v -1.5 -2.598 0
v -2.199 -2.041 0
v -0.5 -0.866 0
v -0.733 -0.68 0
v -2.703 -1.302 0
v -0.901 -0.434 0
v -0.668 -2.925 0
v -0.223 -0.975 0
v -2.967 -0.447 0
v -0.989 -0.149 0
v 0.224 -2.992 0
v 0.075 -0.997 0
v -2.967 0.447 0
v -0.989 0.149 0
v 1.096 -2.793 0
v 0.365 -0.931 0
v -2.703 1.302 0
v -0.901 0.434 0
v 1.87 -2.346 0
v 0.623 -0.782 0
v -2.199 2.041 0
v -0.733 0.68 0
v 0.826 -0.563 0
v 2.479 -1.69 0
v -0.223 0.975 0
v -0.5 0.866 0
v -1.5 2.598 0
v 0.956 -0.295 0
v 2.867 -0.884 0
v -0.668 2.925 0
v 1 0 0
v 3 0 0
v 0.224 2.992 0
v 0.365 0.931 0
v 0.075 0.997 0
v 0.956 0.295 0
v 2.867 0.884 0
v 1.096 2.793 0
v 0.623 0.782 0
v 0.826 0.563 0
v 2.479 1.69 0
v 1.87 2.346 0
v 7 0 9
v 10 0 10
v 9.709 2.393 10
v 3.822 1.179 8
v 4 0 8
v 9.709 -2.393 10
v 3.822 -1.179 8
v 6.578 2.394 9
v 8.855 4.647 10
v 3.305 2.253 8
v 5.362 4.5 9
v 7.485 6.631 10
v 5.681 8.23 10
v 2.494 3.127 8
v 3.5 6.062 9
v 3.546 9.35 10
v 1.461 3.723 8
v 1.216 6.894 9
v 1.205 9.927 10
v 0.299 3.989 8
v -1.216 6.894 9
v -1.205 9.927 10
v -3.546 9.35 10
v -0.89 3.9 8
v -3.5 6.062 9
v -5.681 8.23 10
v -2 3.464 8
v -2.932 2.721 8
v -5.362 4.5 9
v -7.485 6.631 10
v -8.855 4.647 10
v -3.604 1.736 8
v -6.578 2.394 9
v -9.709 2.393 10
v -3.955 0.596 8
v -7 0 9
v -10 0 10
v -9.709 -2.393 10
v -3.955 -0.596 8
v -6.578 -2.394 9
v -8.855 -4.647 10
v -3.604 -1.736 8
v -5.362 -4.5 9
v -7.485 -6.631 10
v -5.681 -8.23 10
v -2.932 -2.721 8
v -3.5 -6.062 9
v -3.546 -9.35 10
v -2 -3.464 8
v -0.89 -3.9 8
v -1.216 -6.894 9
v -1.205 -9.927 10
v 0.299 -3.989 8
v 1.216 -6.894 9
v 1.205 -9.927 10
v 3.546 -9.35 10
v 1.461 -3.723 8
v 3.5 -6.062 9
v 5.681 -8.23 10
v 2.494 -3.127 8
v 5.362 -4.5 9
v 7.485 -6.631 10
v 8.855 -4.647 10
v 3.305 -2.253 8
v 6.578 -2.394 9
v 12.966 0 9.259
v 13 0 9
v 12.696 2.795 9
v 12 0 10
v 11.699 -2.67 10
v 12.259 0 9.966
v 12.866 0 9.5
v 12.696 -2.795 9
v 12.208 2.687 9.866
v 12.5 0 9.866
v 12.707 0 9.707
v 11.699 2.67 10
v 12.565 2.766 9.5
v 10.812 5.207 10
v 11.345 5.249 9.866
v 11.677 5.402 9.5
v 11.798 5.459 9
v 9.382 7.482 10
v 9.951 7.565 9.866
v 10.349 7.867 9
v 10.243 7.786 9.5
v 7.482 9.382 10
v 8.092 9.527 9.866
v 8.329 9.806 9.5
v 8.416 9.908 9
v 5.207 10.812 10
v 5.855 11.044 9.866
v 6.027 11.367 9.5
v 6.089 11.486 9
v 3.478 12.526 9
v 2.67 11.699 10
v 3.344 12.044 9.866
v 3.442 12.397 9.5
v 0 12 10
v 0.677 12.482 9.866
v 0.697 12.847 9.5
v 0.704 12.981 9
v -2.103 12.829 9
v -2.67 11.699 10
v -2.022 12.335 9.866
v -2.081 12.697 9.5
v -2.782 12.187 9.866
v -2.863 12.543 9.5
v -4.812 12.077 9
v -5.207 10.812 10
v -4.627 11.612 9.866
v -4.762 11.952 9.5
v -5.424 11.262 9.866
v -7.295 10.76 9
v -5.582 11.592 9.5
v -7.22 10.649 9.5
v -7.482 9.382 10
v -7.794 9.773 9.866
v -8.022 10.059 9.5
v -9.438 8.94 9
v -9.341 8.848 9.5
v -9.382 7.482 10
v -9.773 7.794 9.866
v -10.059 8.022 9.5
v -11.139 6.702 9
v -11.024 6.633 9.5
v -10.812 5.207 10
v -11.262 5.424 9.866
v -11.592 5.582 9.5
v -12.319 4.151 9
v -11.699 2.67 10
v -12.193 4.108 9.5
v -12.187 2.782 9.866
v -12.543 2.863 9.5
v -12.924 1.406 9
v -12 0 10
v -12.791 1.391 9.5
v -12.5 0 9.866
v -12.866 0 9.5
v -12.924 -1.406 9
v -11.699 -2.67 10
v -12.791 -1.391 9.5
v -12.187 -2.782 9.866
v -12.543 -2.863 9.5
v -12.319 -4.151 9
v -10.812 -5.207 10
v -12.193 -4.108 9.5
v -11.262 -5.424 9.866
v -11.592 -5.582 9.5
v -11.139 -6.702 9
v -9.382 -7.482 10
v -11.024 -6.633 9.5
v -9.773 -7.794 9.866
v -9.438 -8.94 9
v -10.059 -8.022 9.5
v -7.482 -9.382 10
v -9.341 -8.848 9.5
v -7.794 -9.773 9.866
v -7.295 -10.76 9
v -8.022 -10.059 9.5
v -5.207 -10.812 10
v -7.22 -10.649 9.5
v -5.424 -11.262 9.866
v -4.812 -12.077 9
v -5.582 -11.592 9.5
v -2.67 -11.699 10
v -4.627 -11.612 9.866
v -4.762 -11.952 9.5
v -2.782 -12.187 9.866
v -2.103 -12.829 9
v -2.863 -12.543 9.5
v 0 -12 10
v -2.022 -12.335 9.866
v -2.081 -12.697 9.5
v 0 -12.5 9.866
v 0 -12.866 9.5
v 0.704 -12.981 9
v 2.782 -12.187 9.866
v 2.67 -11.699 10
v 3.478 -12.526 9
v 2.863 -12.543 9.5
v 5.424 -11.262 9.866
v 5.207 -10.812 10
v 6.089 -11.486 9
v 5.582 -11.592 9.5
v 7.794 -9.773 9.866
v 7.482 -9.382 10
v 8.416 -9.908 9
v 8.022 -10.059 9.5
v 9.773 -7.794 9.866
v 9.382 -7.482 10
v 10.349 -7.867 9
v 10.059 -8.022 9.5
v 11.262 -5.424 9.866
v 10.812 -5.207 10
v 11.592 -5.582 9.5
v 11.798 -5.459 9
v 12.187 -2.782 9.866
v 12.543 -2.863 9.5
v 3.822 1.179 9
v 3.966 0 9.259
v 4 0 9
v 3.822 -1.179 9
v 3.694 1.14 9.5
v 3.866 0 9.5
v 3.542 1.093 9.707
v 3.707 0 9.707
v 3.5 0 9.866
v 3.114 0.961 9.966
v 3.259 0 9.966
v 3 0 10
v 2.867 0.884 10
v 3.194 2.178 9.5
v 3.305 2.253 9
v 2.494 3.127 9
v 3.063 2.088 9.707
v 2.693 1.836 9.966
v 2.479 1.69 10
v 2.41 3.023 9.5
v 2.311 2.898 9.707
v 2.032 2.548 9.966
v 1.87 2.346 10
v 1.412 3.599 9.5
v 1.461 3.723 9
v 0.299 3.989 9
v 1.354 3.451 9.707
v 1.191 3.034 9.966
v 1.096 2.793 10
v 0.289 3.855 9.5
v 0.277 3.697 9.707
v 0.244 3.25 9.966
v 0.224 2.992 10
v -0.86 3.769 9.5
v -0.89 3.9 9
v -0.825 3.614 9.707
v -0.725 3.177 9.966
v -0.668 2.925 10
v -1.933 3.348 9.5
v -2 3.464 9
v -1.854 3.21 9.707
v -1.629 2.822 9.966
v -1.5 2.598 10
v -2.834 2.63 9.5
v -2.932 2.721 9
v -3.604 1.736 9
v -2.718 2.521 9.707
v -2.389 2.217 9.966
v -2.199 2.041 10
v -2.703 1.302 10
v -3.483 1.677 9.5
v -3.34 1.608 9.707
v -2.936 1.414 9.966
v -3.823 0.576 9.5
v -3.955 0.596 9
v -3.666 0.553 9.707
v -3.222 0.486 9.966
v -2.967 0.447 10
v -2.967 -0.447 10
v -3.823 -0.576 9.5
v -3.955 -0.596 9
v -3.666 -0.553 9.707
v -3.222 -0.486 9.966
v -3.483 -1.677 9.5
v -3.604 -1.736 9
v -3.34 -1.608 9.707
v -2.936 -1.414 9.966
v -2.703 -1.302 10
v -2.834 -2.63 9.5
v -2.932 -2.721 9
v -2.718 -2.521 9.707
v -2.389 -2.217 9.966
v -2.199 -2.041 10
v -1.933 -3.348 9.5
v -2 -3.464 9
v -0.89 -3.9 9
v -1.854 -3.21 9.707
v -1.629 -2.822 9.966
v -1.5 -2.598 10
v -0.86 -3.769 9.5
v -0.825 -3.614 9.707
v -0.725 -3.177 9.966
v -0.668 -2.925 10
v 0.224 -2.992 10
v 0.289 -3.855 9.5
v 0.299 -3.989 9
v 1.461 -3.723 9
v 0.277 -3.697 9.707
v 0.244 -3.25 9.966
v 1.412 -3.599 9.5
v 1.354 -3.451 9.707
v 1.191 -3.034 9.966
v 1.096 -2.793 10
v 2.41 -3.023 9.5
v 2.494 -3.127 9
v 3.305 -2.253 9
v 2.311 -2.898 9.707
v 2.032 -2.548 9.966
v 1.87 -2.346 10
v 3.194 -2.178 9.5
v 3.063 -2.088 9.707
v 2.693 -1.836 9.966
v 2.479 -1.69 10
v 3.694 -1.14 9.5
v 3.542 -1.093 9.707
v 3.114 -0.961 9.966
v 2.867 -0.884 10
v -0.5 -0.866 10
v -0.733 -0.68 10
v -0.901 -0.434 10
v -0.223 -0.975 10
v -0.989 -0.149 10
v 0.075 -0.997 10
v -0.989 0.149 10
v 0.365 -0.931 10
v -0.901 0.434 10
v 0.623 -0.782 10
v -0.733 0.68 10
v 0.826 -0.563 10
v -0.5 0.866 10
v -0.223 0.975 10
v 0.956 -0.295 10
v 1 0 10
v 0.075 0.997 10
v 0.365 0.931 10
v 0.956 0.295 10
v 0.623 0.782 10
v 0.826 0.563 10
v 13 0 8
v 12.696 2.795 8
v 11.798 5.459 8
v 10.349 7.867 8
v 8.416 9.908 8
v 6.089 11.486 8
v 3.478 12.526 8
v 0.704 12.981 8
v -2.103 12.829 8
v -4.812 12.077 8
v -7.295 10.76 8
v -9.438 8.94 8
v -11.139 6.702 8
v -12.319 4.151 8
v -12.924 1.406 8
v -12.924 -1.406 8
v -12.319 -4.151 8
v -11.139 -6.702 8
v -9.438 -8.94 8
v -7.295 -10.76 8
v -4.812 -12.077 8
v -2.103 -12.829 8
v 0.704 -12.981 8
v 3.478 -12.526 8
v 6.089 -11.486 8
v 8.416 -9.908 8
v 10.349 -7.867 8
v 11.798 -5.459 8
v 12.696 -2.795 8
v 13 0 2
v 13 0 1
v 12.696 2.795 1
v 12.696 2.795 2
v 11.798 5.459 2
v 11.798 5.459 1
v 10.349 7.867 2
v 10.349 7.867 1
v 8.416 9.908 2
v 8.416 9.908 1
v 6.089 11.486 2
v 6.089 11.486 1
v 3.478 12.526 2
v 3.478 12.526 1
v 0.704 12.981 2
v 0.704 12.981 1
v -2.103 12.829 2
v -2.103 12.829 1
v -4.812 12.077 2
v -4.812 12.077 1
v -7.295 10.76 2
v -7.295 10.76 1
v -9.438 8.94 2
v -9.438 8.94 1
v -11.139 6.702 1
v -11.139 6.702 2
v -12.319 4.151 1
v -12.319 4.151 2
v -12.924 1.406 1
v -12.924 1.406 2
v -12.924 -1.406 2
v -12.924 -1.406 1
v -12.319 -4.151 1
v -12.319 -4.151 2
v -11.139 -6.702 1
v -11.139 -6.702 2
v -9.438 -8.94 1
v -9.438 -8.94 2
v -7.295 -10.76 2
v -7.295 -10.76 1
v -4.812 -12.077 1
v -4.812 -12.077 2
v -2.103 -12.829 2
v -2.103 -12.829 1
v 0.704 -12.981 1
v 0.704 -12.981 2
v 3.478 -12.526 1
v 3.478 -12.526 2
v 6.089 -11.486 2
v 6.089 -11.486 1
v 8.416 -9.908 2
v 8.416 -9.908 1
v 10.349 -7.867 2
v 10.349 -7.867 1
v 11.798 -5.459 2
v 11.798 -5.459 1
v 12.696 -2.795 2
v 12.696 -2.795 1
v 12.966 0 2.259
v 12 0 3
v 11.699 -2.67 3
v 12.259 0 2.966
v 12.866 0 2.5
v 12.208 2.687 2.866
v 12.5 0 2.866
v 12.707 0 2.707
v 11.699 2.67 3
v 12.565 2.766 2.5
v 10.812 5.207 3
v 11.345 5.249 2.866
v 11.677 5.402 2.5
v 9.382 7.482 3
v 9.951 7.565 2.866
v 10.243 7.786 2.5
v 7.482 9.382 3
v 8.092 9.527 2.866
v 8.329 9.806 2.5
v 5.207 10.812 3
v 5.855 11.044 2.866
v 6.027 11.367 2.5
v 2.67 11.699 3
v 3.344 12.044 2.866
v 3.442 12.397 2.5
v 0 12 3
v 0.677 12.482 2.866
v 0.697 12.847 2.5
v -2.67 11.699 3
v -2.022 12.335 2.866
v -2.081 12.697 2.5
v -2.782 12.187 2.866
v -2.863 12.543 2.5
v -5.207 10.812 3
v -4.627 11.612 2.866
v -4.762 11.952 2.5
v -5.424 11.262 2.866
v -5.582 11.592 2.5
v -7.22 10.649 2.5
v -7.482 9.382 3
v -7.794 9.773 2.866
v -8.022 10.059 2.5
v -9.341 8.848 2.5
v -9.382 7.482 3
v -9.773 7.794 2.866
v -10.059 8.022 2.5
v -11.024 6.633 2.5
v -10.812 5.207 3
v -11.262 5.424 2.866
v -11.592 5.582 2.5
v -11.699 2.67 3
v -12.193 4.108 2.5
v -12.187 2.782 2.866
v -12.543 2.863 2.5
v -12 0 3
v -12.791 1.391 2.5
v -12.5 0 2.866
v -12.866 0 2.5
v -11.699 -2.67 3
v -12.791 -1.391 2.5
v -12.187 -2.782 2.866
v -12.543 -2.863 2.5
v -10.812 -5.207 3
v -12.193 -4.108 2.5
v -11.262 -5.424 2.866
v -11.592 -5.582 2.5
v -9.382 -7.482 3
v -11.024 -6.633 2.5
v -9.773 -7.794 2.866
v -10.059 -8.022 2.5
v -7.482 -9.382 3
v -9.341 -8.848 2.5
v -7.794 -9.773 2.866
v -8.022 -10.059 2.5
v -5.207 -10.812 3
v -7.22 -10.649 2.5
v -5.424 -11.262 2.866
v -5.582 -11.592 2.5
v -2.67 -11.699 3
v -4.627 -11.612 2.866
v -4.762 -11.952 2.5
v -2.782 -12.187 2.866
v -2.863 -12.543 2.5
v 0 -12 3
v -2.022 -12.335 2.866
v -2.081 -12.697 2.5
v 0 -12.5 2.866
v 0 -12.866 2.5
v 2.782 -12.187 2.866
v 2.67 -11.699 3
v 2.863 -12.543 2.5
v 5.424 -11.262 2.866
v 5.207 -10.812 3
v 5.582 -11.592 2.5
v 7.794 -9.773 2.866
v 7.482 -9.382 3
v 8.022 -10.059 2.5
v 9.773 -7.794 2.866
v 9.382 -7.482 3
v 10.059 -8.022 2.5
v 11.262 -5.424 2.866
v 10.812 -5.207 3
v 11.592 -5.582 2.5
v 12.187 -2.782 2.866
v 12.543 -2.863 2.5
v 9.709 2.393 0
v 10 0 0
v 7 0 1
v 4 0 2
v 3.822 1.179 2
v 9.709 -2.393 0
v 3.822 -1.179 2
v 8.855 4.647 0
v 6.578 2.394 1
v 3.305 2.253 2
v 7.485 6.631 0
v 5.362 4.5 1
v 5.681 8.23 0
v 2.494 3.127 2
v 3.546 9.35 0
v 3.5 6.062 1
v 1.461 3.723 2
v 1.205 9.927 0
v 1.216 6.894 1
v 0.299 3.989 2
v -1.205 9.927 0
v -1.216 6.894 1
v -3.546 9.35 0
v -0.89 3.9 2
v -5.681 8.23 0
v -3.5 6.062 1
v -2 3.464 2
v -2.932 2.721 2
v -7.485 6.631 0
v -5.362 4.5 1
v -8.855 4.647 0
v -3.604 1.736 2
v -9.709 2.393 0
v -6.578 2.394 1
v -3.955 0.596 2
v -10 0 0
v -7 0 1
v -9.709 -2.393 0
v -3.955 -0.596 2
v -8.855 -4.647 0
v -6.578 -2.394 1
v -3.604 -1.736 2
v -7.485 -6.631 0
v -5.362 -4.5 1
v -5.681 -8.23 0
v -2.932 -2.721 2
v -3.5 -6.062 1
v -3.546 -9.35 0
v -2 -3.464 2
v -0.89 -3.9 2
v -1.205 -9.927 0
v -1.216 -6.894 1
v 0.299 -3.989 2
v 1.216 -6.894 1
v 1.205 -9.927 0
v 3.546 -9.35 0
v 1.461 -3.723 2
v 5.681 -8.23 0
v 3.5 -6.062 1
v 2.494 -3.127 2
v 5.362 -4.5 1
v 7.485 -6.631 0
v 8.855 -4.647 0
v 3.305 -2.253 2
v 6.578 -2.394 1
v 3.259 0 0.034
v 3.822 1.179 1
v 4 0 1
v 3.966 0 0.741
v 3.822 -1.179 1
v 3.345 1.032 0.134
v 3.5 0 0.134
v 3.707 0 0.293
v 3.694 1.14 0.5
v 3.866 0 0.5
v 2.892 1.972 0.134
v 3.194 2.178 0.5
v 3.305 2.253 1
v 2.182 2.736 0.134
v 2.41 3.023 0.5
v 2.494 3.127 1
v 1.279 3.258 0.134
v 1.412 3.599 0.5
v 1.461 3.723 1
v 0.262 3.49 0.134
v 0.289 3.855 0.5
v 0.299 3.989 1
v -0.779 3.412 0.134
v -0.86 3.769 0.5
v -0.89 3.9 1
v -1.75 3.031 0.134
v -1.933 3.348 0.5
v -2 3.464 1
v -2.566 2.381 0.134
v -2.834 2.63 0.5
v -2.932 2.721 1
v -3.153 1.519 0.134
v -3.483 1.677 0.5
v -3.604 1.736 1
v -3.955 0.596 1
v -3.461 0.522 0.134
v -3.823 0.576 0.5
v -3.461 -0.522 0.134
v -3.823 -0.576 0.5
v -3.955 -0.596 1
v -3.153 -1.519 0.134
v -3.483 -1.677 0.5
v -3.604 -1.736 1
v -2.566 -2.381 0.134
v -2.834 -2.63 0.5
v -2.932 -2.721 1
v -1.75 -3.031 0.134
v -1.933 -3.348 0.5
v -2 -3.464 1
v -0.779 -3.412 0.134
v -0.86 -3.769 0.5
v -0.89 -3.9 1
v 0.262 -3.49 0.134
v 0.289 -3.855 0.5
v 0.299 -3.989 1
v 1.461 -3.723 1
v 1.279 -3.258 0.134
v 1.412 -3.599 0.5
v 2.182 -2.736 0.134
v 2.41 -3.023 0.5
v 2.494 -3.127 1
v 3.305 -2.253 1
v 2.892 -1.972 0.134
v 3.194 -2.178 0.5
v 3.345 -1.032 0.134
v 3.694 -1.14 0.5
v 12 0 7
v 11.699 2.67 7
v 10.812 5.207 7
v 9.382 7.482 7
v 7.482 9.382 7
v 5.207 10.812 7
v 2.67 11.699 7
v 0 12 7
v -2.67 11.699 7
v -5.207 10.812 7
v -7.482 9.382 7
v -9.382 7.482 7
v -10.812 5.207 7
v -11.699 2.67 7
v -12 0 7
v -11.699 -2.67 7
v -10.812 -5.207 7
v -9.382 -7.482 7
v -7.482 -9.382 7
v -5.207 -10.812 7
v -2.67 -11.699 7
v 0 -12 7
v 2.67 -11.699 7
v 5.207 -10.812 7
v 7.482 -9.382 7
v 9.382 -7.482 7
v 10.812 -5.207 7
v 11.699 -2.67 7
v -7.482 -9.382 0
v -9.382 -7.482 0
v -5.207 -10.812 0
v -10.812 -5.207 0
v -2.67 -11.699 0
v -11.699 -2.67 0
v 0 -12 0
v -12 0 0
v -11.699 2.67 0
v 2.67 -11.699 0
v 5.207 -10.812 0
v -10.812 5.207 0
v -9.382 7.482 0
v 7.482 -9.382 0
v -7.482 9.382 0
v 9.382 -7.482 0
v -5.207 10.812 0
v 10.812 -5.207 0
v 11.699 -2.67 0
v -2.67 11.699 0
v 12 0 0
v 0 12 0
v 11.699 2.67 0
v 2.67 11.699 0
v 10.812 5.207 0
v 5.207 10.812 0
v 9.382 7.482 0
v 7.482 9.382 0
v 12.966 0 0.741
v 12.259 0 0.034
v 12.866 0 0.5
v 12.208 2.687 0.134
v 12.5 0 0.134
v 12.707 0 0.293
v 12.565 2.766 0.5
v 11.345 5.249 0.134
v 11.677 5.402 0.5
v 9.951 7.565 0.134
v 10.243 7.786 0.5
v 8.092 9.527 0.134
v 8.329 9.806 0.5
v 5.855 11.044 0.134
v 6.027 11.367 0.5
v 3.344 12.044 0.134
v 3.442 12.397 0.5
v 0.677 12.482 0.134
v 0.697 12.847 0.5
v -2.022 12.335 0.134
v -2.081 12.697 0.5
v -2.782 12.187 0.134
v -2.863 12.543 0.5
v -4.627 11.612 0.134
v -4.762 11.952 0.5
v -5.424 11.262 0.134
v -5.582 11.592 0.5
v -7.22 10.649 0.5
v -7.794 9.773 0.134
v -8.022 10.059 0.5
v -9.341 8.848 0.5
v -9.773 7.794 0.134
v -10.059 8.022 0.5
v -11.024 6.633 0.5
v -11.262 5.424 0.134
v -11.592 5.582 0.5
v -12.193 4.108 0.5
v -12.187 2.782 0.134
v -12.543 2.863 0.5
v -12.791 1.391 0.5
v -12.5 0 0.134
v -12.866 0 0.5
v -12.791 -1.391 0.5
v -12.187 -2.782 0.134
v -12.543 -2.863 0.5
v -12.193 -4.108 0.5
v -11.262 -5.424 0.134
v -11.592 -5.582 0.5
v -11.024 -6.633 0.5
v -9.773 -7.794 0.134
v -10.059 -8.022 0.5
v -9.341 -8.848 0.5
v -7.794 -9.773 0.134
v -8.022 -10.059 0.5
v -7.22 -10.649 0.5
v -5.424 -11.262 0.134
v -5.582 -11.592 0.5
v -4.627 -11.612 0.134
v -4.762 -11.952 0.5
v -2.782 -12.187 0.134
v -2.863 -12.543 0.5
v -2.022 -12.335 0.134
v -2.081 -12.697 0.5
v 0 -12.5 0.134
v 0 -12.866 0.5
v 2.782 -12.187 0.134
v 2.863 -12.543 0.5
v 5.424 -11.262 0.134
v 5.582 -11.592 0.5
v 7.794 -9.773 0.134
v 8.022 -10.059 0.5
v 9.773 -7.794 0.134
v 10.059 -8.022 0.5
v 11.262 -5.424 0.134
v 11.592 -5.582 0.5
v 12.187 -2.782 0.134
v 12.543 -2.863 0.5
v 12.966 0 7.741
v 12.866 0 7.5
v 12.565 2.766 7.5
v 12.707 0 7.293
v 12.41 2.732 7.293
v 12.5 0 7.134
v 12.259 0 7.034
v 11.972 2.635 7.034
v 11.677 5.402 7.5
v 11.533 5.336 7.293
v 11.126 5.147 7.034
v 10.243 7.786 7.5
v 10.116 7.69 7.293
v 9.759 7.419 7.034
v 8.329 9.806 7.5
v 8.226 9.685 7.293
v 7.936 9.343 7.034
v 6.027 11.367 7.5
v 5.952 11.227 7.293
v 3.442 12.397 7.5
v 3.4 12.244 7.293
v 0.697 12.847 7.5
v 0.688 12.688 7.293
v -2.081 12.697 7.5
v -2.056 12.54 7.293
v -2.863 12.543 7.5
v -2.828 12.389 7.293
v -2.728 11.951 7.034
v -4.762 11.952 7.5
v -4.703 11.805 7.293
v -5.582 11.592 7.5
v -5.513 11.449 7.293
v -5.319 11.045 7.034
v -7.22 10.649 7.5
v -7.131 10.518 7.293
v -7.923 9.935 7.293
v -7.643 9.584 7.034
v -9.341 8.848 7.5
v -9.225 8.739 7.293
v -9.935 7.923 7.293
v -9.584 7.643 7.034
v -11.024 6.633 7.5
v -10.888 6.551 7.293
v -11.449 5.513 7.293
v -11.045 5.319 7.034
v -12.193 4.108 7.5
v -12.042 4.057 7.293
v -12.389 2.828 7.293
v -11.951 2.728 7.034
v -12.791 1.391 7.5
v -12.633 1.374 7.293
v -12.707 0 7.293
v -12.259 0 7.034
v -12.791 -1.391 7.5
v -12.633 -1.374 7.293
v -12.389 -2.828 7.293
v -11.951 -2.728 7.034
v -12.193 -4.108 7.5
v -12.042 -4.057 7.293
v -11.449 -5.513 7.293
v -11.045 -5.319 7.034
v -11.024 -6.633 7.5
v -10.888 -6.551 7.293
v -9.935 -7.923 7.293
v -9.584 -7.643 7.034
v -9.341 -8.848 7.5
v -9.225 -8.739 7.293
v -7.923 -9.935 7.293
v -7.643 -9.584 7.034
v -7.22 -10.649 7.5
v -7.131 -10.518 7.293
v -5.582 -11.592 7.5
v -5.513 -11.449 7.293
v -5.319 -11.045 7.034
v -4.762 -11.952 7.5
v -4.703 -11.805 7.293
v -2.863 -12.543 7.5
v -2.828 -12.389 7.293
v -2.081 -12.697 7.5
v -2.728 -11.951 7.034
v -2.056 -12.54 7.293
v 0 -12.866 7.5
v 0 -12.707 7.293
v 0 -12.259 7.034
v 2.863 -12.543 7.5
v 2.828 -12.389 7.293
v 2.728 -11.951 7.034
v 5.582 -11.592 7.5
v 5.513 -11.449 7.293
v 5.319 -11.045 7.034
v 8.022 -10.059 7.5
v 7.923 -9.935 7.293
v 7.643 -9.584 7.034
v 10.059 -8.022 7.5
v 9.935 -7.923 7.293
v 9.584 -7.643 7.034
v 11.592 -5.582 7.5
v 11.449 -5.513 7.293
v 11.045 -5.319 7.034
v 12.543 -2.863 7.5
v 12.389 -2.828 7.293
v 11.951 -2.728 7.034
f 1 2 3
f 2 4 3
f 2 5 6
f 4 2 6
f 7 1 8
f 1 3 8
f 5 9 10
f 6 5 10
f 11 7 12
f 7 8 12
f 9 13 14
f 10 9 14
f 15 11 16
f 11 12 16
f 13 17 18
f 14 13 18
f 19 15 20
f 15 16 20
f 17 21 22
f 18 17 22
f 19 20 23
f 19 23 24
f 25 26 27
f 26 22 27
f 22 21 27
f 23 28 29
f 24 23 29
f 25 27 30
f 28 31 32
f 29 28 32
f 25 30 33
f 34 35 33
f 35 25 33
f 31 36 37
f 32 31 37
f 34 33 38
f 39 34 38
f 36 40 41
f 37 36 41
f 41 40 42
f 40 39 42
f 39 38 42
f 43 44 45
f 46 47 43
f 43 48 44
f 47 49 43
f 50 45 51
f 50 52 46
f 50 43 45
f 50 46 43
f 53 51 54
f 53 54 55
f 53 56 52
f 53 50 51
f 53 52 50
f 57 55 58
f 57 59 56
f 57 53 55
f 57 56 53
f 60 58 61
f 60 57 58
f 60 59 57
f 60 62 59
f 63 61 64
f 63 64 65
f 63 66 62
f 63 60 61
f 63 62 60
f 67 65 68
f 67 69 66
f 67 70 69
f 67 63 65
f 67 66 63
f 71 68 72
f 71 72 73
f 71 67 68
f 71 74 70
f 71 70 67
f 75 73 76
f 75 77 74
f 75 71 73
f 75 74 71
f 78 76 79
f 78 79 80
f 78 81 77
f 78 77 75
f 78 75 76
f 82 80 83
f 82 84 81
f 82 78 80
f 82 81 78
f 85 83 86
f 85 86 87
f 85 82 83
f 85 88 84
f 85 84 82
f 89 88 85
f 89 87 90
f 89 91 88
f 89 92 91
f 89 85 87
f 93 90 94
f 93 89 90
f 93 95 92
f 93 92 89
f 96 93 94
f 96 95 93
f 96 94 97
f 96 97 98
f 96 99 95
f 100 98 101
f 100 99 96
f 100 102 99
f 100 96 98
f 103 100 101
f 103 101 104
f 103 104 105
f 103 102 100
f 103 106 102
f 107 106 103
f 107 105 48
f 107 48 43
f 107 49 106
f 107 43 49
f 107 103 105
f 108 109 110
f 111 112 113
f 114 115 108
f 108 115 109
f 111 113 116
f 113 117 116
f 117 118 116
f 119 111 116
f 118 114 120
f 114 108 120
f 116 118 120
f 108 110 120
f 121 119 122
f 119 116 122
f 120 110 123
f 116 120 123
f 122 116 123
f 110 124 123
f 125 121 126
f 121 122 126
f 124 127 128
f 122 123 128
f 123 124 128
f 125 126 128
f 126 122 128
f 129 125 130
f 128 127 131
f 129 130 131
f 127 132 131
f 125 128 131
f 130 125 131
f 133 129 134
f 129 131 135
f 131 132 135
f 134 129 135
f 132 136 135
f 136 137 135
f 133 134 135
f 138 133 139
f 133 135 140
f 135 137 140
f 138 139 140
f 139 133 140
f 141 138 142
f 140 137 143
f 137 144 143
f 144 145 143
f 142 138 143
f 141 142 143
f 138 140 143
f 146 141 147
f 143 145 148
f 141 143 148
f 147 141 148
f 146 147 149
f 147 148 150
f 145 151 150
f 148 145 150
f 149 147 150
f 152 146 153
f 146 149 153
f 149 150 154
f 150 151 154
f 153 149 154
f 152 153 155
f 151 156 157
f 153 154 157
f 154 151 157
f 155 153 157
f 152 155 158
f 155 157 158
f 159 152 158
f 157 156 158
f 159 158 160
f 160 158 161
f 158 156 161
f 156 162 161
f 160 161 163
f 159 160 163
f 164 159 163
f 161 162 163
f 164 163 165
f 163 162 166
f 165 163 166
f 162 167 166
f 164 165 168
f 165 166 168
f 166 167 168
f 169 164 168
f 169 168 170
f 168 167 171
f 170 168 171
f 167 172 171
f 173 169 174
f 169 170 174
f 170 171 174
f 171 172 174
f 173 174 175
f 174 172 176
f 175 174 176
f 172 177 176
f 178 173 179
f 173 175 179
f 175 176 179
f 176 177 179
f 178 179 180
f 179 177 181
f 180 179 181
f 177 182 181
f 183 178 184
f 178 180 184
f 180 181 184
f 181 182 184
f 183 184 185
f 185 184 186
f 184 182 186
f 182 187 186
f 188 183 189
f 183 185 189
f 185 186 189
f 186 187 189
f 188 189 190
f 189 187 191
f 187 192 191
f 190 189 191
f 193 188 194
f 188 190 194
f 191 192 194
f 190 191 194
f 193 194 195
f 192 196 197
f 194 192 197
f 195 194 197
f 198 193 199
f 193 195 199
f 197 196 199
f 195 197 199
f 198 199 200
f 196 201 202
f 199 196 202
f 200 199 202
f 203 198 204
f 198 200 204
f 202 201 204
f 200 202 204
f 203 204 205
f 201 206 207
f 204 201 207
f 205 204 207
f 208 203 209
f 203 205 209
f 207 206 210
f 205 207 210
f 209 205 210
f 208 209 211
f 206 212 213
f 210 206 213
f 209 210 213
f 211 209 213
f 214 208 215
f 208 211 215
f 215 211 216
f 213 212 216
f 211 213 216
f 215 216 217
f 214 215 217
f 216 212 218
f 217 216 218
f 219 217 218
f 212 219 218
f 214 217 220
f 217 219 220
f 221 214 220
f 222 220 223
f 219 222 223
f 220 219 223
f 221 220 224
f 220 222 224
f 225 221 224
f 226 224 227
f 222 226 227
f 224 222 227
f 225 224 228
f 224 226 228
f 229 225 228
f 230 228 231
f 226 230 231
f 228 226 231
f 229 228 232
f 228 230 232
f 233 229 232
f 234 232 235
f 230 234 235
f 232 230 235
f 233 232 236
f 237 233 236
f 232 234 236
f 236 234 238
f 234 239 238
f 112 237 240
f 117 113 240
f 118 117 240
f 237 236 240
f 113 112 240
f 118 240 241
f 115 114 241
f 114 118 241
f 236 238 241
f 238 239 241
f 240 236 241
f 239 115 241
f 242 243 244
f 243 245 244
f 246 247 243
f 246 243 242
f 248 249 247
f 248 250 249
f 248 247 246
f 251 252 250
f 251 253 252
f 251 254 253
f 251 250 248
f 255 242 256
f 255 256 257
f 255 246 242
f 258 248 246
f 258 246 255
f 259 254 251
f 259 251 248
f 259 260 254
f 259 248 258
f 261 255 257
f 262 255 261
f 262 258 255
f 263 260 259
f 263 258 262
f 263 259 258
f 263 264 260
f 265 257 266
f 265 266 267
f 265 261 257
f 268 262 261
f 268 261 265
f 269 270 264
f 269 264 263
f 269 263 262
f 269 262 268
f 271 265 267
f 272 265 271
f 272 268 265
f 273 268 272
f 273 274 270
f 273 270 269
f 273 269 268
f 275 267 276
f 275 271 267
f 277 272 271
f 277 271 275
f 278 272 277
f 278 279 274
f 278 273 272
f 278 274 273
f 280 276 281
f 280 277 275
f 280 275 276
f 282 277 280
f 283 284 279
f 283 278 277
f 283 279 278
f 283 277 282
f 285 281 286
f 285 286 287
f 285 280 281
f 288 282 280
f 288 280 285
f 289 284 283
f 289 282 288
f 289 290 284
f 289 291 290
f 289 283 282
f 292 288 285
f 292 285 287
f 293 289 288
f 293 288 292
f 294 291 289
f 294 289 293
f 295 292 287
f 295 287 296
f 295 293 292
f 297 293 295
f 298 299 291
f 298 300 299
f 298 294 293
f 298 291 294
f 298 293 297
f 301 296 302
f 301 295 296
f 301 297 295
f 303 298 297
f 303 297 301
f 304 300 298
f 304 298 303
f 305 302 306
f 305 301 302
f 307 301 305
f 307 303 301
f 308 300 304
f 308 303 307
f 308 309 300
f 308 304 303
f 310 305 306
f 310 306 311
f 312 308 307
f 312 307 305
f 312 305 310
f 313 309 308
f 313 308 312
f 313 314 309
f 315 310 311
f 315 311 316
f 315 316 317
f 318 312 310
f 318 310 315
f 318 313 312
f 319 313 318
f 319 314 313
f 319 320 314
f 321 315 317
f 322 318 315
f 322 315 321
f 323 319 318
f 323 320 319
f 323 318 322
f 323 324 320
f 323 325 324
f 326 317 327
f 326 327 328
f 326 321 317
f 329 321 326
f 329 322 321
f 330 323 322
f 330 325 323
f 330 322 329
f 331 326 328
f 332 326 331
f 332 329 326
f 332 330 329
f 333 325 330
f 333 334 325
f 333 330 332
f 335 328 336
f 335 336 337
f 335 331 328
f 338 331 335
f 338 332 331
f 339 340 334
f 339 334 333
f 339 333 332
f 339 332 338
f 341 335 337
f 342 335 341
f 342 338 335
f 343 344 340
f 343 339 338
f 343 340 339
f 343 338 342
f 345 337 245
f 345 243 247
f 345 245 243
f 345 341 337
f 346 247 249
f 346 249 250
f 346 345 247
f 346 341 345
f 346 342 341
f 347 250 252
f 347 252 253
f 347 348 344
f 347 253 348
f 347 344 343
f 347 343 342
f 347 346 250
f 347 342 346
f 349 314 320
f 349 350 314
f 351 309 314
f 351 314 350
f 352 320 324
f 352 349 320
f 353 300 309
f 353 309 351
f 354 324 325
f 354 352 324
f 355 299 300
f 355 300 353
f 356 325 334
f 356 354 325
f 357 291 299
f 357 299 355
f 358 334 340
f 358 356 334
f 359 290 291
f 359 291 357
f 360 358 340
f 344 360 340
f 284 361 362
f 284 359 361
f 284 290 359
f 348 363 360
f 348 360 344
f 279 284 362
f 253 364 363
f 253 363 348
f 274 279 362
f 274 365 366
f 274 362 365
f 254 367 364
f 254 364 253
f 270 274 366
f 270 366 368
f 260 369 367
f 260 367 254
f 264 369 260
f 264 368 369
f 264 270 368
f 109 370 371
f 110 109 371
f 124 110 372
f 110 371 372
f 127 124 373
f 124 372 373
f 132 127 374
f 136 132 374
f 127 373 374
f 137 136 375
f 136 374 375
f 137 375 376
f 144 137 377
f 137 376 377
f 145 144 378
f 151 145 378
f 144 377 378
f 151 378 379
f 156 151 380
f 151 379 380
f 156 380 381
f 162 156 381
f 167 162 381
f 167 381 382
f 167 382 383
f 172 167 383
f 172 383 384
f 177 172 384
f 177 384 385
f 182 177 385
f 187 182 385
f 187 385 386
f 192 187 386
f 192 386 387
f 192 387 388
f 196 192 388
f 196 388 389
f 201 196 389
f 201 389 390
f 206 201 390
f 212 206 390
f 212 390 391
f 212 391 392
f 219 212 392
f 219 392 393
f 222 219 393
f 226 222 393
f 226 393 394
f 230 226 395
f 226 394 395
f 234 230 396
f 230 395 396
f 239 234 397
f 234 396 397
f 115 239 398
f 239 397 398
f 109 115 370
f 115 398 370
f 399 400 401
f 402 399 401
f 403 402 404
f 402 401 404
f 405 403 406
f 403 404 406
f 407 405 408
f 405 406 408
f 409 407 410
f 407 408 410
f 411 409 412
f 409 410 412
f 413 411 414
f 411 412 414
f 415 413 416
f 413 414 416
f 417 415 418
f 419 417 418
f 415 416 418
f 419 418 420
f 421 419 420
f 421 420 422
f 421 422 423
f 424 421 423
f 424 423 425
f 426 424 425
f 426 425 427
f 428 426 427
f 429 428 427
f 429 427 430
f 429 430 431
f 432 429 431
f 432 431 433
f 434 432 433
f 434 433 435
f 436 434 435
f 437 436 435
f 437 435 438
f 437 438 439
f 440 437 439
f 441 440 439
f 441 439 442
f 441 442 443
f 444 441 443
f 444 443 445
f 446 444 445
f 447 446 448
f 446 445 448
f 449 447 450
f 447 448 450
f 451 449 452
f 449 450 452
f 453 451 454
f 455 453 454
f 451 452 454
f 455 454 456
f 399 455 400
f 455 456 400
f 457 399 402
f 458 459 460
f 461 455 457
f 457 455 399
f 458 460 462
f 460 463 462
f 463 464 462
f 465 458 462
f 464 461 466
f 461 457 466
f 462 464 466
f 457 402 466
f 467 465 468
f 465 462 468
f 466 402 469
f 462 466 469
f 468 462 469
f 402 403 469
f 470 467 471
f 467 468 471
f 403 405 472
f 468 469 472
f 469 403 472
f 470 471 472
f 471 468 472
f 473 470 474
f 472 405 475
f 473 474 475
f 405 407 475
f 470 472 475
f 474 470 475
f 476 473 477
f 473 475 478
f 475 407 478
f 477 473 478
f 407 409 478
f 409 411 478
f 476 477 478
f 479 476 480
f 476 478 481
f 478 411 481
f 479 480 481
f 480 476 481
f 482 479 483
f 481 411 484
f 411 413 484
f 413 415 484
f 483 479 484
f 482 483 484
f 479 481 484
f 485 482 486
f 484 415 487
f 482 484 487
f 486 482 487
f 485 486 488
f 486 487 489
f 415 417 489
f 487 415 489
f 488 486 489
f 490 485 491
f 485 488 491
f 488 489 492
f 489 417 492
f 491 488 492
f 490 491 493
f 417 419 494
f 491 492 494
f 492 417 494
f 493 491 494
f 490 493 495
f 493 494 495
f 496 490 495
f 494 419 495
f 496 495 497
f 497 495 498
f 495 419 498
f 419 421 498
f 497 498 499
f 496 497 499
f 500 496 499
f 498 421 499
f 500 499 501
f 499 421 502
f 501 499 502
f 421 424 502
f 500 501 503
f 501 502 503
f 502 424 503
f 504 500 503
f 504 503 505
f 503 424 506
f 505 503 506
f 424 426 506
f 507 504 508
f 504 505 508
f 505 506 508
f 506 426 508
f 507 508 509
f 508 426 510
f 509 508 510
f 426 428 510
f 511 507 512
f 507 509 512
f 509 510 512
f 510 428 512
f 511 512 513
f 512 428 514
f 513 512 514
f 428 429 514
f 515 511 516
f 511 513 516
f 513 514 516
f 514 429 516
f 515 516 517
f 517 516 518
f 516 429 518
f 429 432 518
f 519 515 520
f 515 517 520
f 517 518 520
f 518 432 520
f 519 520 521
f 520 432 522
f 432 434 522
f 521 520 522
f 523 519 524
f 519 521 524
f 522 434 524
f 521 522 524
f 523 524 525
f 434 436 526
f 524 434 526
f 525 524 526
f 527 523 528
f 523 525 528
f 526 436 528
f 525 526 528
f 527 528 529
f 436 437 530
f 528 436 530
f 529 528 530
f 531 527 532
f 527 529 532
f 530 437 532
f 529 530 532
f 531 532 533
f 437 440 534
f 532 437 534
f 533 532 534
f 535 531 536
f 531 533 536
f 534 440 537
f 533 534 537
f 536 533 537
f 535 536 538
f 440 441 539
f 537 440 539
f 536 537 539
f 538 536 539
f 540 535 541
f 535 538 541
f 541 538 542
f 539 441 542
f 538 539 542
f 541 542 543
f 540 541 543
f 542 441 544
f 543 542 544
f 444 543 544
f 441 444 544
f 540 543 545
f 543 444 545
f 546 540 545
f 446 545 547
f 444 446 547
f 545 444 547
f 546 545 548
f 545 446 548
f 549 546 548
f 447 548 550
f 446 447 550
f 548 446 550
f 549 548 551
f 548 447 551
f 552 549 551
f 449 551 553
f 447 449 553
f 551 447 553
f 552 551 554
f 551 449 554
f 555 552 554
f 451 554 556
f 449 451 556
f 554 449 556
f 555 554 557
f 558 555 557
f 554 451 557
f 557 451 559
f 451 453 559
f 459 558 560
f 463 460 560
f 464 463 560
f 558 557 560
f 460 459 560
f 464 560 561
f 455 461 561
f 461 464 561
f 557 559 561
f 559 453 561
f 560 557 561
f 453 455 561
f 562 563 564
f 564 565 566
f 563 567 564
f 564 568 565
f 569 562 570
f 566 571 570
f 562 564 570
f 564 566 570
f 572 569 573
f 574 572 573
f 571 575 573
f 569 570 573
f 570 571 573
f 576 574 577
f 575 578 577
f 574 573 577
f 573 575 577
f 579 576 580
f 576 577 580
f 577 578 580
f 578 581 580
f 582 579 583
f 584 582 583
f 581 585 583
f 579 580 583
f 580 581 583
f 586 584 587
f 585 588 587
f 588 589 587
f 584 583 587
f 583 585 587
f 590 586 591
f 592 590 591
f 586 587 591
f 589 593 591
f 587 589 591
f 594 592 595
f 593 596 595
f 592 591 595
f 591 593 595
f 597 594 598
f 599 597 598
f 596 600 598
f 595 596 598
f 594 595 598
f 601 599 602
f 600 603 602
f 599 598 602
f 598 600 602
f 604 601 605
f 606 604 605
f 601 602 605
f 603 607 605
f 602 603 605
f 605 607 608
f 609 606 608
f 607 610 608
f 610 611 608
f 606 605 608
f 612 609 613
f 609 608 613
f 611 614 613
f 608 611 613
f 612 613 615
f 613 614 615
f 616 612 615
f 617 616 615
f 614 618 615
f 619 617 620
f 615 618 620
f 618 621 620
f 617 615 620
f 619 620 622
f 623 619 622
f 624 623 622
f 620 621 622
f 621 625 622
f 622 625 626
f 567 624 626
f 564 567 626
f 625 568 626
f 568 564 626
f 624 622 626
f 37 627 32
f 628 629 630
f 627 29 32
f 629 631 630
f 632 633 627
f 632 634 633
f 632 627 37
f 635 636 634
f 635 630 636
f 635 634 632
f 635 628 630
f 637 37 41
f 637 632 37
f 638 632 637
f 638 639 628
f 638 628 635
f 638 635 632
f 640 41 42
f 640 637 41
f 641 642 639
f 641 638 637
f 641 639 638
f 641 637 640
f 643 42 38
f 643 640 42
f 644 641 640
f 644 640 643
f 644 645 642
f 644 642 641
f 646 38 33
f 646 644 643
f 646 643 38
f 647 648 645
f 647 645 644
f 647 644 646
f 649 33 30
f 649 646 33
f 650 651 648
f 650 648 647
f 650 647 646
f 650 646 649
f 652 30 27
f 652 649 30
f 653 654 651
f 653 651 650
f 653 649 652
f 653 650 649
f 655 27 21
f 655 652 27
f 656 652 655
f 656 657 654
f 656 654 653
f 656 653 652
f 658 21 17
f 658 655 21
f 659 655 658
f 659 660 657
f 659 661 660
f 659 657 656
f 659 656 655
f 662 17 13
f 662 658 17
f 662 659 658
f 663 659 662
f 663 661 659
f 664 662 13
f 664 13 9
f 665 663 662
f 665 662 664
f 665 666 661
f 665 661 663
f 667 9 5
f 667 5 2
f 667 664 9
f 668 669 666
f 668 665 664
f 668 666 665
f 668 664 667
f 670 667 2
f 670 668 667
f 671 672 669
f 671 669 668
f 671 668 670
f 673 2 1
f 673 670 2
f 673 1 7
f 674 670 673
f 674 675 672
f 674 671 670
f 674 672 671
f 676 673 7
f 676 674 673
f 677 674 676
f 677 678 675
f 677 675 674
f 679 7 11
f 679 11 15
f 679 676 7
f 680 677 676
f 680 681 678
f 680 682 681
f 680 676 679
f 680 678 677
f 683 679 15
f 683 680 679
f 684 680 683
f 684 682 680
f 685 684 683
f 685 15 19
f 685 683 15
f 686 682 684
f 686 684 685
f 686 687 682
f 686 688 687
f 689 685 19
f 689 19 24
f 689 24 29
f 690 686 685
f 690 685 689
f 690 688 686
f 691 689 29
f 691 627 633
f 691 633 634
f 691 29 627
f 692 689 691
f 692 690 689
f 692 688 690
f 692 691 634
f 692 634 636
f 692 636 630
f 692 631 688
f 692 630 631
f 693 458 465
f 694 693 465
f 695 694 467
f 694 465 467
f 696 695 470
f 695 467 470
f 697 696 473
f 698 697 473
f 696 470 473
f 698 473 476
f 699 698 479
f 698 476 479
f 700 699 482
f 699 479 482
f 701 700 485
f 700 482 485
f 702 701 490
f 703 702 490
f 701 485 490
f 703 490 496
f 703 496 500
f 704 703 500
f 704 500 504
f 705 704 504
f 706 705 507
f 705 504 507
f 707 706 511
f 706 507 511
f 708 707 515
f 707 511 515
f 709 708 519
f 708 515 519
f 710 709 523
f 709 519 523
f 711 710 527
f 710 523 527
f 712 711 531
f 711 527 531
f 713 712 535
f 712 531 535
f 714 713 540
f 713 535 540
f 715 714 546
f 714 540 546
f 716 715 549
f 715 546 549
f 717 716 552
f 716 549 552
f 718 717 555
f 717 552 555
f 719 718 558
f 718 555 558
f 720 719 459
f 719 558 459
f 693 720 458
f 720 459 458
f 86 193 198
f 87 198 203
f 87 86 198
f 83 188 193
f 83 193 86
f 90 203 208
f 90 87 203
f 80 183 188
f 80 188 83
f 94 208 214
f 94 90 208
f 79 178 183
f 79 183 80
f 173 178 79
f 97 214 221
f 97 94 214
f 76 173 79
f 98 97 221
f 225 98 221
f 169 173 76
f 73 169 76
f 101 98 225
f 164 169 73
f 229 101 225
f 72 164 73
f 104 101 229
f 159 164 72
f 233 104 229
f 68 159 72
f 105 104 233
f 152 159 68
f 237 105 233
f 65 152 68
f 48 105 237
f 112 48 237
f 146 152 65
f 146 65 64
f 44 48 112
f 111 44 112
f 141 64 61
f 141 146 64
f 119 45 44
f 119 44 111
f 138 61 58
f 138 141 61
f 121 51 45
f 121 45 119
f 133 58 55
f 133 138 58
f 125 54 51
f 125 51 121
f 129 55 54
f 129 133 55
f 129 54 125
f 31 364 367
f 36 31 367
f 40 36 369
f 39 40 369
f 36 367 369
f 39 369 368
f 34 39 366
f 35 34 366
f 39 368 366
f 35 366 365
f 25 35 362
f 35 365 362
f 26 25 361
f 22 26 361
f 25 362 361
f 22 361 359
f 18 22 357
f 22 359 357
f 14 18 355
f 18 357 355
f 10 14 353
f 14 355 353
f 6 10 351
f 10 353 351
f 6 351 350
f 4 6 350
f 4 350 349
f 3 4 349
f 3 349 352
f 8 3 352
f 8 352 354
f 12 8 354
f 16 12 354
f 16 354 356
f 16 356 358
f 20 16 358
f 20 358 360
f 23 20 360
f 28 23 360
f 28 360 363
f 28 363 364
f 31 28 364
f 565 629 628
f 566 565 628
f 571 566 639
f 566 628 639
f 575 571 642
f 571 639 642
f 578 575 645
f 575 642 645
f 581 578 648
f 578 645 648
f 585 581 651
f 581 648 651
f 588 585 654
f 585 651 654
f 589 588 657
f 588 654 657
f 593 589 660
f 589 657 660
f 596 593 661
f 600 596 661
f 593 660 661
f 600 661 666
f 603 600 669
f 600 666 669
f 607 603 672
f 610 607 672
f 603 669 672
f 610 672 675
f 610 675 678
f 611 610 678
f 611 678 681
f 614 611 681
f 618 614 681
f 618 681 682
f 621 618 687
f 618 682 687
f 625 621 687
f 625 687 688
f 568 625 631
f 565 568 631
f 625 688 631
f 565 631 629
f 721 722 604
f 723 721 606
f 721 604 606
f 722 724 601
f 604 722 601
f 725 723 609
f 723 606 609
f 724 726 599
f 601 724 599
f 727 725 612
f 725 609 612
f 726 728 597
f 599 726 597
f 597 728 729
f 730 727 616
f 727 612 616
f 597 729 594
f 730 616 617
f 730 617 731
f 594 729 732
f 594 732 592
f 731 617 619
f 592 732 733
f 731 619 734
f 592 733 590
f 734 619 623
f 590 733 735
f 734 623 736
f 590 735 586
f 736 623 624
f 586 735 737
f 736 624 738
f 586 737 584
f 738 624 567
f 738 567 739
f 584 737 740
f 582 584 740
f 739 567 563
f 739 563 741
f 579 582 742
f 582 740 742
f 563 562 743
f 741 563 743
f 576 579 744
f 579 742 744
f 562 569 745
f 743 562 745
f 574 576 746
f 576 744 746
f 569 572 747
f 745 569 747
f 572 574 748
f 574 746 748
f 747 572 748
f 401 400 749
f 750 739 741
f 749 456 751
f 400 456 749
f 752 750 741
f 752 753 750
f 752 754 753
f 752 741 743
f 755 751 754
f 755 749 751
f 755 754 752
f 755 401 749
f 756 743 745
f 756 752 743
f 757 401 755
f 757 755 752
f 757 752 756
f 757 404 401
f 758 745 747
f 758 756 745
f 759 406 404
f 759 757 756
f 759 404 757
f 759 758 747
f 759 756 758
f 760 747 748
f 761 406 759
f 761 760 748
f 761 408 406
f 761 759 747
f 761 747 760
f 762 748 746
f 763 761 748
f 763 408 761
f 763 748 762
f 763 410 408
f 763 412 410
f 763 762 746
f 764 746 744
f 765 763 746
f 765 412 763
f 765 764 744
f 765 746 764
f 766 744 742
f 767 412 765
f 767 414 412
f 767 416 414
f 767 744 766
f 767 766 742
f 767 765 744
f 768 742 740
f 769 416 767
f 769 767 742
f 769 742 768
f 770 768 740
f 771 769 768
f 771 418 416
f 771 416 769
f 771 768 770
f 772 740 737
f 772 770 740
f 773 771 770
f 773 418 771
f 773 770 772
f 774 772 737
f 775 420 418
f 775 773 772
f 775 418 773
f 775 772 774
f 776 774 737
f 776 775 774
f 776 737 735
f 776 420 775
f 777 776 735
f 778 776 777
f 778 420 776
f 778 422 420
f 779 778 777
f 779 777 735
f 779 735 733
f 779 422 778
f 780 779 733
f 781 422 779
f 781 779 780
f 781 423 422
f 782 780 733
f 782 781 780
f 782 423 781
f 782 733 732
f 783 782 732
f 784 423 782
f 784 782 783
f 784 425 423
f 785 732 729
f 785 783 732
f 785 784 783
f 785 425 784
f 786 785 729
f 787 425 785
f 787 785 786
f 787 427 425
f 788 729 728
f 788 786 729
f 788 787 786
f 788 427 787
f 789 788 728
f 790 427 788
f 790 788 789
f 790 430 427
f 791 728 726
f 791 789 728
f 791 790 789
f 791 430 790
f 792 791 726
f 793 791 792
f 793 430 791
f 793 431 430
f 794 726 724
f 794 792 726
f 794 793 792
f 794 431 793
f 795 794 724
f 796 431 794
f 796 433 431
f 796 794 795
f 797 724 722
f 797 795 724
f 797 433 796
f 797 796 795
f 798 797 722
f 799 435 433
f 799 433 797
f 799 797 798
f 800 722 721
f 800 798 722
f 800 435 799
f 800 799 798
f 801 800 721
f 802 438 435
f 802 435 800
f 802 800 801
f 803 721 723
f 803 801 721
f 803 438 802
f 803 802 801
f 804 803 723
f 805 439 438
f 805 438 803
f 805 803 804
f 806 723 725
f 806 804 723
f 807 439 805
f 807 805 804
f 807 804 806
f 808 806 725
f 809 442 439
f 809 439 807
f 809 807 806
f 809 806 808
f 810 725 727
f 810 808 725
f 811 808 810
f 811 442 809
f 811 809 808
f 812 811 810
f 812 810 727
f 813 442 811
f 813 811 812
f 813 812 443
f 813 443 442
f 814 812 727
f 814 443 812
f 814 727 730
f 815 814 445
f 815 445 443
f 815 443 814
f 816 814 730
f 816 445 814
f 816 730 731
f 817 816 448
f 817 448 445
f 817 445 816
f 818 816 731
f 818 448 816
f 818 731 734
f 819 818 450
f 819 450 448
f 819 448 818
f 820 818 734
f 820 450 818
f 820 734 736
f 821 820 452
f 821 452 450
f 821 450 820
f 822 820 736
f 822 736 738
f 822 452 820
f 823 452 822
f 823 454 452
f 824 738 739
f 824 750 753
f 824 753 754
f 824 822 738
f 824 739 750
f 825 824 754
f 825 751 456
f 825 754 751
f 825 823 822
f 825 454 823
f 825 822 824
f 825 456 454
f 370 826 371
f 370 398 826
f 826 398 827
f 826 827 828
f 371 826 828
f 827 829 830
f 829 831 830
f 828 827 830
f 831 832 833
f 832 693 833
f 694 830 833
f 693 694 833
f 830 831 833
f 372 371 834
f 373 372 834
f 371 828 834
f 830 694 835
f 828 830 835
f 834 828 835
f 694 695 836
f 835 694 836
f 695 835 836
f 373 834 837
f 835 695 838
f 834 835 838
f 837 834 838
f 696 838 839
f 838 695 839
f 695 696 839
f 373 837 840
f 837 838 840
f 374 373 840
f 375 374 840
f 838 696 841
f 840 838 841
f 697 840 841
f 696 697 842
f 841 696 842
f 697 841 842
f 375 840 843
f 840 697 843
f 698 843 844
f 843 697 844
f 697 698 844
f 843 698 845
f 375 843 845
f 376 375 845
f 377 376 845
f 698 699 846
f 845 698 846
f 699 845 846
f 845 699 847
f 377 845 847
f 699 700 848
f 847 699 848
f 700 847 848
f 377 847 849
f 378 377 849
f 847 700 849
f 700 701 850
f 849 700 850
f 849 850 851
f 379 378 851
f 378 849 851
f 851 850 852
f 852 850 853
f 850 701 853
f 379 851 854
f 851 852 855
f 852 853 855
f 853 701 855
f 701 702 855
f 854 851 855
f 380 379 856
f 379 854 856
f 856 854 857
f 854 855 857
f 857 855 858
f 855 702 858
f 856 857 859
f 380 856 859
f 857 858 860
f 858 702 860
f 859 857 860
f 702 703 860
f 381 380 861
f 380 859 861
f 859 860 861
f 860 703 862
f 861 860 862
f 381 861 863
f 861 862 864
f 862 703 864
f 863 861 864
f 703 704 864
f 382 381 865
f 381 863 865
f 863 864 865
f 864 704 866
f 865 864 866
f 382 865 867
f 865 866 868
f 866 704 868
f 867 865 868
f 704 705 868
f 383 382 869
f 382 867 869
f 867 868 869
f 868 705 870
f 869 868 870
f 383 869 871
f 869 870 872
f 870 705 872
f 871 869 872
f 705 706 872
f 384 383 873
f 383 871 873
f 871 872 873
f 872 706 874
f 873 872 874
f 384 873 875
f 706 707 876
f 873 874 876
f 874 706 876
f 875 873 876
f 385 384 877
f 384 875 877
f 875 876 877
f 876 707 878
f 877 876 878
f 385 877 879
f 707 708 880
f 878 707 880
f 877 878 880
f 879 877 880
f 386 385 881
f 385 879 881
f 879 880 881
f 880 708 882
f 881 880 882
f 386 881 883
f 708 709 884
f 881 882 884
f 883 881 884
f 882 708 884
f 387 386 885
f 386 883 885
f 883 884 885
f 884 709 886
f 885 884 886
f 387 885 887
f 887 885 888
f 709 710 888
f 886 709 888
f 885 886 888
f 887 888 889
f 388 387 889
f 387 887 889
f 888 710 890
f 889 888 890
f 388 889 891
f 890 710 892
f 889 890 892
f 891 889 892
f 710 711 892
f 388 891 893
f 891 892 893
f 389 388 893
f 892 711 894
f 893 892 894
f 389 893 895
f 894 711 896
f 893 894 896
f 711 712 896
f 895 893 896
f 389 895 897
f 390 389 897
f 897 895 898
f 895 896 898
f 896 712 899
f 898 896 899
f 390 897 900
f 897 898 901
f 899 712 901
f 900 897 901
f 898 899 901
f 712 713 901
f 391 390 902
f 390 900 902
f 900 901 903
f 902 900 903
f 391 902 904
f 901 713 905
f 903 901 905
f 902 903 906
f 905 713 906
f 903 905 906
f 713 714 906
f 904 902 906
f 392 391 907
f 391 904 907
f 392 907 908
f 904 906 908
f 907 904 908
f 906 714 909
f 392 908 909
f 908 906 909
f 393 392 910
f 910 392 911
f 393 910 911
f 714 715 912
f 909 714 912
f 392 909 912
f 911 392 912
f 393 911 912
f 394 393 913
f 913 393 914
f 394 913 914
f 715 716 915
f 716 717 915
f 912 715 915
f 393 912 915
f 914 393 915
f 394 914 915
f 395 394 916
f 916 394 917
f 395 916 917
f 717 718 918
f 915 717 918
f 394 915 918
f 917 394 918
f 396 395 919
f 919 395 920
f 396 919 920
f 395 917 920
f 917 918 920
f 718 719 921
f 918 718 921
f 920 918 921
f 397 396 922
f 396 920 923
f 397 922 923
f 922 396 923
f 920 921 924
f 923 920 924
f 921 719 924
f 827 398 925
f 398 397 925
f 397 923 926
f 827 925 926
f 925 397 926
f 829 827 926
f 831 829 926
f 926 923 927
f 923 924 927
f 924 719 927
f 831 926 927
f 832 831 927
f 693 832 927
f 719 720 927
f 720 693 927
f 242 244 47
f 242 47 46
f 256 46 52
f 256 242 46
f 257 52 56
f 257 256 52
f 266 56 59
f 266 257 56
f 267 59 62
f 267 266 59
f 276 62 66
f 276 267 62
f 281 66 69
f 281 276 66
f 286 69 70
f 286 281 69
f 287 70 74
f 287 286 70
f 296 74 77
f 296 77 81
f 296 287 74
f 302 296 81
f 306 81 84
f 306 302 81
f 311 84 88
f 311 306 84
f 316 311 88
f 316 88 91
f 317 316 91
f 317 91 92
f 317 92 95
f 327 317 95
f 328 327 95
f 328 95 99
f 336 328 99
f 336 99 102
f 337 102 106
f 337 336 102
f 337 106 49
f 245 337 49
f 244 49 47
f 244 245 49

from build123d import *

# Parameters (mm, degrees)
F0_R      = 13
F0_R_2    = 1
F1_DEPTH  = 10
F4_R      = 10
F3_R      = 4
F8_R      = 10
F7_R      = 4
F11_R     = 4
F11_R_2   = 1
F12_DEPTH = 2
F14_R     = 13
F14_R_2   = 12
F15_DEPTH = 4
F16_R     = 0.99999


# Not quite as in the source:
# - a fillet or chamfer is up to 0.001 mm smaller than in the source, because OpenCascade refuses the exact size
# - a feature of the source that left no trace in its solid (it failed there, or was rolled back) is left out
# - a pattern or mirror of a feature is missing from the dataset's text; its kind, count and spacing are read off the source's solid


with BuildPart() as f1:
    # F0 (on Top) → F1 (new body)
    with BuildSketch(Plane.XY):
        Circle(F0_R)
        Circle(F0_R_2, mode=Mode.SUBTRACT)
    extrude(amount=F1_DEPTH)

    # F4 (on face) → F5 section 0
    with BuildSketch(Plane.XY.offset(10)):
        Circle(F4_R)
    # F3 (on offset) → F5 section 1
    with BuildSketch(Plane.XY.offset(8)):
        Circle(F3_R)
    loft(mode=Mode.SUBTRACT)

    # F8 (on face) → F9 section 0
    with BuildSketch(Plane.XY):
        Circle(F8_R)
    # F7 (on offset) → F9 section 1
    with BuildSketch(Plane.XY.offset(2)):
        Circle(F7_R)
    loft(mode=Mode.SUBTRACT)

    # F11 (on face) → F12 (join, through all)
    with BuildSketch(Plane.XY):
        Circle(F11_R)
        Circle(F11_R_2, mode=Mode.SUBTRACT)
    f12 = extrude(amount=F12_DEPTH)

    # F12_copies: F12 across plane
    add(f12.mirror(Plane.XY.offset(5)))

    # F14 (on offset) → F15 (cut)
    with BuildSketch(Plane.XY.offset(3)):
        Circle(F14_R)
        Circle(F14_R_2, mode=Mode.SUBTRACT)
    extrude(amount=F15_DEPTH, mode=Mode.SUBTRACT)

    # F16 (radius 1 in the source; OpenCascade refuses exactly that, so slightly less here)
    f16_edges = [f1.edges().sort_by_distance(p)[0] for p in [
        (-4, 0, 0),
        (-13, 0, 10),
        (-13, 0, 0),
        (-13, 0, 7),
        (-13, 0, 3),
        (-4, 0, 10),
    ]]
    fillet(f16_edges, radius=F16_R)


solid = f1.part
